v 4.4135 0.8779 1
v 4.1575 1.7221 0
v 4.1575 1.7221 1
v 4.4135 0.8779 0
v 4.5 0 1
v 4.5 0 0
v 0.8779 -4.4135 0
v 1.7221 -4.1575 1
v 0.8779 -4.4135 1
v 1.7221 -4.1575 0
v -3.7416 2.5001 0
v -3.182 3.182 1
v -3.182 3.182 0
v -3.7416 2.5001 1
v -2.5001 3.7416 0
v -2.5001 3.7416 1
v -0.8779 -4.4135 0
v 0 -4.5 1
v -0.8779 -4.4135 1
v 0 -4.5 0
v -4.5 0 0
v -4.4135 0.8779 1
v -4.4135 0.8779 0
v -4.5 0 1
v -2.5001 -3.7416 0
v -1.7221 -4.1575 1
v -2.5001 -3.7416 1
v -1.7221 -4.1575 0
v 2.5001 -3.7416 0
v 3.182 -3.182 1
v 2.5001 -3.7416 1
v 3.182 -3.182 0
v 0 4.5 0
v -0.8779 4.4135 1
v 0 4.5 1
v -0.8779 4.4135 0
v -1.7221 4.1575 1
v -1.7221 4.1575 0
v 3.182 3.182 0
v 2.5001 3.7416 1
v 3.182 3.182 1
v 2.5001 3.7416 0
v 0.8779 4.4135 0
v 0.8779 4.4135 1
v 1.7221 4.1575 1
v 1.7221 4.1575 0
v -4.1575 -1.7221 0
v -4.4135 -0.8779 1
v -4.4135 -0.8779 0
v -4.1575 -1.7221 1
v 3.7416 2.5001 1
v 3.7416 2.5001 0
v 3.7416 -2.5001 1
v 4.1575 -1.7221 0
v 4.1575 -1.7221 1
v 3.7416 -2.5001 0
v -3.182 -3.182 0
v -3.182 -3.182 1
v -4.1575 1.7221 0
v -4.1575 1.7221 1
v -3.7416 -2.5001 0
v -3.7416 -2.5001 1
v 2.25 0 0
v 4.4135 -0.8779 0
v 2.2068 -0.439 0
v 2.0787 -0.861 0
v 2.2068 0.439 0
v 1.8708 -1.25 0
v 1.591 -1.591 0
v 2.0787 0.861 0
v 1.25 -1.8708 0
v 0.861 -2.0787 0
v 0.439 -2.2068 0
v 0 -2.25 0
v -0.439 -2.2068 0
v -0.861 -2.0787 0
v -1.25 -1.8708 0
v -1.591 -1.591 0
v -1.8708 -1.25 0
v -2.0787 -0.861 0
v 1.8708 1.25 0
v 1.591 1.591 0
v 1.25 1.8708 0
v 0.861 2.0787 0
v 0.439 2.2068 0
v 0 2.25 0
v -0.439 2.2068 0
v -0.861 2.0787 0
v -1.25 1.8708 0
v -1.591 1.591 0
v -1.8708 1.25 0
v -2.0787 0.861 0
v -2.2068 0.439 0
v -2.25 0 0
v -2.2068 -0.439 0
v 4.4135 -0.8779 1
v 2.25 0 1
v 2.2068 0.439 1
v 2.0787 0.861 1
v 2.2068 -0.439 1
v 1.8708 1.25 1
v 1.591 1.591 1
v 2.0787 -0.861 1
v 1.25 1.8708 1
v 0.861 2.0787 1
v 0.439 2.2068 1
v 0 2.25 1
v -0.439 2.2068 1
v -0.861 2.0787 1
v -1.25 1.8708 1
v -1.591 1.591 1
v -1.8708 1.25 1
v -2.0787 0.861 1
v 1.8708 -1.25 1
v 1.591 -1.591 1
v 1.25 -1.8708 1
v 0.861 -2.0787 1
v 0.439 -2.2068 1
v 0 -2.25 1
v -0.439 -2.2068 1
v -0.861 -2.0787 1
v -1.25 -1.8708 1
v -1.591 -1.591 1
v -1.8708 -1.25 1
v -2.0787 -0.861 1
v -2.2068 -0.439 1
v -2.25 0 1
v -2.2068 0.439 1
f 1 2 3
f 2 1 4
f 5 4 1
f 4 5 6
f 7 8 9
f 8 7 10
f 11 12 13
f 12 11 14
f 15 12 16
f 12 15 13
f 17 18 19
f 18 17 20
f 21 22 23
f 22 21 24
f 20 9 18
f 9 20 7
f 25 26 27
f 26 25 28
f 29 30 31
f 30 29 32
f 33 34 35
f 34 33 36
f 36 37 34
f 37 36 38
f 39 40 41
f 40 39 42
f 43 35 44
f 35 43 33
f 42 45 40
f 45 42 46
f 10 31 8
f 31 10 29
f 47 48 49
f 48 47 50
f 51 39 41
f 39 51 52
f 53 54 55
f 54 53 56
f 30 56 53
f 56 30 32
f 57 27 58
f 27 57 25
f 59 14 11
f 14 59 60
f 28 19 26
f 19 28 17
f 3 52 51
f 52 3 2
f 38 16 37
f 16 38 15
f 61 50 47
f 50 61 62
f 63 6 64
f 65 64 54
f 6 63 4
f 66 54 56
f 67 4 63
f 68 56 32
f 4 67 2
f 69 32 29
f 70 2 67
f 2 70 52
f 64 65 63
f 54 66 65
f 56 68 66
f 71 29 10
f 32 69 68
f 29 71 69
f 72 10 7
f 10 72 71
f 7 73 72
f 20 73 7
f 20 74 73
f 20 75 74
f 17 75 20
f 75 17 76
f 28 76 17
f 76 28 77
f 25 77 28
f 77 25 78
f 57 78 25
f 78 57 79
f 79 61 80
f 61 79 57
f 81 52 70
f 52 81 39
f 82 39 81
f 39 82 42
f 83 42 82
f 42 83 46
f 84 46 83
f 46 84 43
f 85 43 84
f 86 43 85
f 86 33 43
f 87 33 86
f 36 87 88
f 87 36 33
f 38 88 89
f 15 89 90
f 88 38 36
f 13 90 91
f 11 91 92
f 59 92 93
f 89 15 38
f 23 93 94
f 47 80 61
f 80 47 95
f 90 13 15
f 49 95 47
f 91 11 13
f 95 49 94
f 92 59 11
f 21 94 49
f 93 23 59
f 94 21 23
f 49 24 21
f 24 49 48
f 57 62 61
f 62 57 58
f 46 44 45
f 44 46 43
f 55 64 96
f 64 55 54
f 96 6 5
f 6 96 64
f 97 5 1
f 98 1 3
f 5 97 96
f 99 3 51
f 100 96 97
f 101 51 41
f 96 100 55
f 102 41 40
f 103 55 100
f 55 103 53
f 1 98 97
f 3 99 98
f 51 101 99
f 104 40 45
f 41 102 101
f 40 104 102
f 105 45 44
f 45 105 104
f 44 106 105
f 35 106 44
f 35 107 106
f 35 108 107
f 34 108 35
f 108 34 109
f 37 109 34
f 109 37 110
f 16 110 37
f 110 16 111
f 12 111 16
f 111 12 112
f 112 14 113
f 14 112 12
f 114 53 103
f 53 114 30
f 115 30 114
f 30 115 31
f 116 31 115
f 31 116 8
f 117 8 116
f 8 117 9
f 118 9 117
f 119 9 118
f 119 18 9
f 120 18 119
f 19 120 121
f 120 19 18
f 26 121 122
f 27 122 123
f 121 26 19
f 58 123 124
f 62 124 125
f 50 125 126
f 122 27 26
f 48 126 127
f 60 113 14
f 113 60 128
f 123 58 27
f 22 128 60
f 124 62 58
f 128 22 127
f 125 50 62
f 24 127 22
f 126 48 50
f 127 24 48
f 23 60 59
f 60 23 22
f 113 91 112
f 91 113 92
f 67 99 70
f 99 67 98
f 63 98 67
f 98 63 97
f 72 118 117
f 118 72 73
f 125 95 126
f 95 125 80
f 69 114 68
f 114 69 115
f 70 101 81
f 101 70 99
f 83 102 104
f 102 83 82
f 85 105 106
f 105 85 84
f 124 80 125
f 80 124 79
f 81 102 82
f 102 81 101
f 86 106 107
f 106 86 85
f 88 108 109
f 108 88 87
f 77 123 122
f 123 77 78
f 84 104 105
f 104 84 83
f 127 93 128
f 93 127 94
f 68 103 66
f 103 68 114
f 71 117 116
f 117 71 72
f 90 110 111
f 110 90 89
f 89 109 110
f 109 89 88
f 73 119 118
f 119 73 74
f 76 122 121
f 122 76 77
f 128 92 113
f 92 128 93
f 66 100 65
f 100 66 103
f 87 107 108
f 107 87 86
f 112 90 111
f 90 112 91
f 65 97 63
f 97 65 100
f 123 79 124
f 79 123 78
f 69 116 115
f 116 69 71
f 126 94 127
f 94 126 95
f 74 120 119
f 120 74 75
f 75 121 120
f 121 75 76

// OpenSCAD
// Purchased hardware envelope; no modeled threads, not print.
$fn=32;
difference(){cylinder(d=9,h=1);translate([0,0,-1])cylinder(d=4.5,h=3);}
